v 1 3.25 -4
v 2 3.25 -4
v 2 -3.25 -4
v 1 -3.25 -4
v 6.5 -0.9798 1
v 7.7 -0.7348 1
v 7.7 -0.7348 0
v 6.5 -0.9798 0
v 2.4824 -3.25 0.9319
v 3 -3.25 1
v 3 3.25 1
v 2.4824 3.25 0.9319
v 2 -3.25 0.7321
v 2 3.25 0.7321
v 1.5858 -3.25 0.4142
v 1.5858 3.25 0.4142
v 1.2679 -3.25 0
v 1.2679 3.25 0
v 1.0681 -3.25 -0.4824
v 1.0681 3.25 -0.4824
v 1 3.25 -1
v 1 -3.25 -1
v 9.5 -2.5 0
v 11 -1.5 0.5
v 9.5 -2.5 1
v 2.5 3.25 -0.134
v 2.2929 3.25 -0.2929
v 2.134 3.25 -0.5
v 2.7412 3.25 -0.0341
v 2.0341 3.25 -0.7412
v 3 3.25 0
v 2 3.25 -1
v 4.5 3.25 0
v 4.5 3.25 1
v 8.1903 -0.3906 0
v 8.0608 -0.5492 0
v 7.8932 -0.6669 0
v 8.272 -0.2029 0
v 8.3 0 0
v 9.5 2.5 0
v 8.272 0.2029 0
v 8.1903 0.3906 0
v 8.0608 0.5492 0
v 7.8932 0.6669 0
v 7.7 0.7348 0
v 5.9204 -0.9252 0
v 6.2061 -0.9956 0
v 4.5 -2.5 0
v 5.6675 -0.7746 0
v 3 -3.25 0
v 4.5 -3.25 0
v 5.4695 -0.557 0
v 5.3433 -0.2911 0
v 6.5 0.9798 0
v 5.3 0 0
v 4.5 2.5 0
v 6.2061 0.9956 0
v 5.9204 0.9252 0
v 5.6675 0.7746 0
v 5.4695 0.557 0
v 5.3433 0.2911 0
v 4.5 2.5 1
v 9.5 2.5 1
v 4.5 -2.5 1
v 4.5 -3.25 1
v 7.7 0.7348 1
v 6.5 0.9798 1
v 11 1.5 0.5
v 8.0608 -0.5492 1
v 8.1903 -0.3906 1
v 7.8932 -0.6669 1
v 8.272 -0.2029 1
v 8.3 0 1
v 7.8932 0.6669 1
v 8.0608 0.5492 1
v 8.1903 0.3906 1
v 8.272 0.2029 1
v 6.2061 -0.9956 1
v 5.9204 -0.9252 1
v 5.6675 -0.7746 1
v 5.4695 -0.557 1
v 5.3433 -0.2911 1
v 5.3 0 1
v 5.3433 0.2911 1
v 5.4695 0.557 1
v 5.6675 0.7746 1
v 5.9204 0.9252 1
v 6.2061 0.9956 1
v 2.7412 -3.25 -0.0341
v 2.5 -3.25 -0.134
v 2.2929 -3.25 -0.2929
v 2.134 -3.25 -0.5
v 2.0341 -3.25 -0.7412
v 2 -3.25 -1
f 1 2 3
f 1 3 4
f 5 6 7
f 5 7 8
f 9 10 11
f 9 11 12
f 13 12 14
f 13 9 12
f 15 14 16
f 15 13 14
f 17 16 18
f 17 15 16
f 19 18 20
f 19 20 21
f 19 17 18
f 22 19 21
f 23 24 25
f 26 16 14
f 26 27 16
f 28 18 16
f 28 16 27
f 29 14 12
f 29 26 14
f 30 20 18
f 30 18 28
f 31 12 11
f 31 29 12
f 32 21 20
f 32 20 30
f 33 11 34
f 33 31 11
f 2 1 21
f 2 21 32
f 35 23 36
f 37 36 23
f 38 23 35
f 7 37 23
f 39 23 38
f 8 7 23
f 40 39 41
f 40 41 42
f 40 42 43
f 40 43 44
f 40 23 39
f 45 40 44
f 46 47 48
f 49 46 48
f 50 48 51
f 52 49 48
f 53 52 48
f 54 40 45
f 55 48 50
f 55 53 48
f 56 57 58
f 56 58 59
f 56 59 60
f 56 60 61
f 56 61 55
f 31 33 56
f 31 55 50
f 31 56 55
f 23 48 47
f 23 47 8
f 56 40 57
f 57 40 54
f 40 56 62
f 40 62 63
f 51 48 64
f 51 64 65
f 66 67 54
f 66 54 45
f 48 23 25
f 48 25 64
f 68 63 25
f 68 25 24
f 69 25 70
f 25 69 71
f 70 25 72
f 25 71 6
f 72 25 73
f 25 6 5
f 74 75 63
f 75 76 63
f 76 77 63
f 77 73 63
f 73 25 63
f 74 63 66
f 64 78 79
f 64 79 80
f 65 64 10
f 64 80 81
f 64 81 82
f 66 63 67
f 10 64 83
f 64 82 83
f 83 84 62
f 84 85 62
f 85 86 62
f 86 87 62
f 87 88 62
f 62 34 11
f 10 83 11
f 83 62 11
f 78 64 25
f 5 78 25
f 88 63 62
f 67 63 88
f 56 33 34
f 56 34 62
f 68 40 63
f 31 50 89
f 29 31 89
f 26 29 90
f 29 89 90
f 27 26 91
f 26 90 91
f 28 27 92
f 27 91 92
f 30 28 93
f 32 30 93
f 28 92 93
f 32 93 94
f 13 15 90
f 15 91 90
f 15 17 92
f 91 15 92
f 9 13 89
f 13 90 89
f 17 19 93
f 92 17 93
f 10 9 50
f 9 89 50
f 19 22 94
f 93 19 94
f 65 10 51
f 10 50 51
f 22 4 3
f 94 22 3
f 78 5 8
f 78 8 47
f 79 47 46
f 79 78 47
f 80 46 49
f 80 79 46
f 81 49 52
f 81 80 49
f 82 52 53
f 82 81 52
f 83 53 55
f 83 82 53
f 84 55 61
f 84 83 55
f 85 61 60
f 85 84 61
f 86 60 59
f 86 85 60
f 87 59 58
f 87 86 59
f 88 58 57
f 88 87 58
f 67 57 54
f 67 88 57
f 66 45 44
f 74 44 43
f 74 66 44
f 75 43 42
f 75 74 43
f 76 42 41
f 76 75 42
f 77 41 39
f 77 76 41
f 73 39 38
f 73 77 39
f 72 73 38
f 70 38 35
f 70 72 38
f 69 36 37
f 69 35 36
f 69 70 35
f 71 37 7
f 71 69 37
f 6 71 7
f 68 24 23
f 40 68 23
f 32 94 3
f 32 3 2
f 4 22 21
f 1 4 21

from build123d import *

# Parameters (mm, degrees)
DODANIE_WYCI_GNI_CIE1_DEPTH = 1
WYTNIJ_WYCI_GNI_CIE1_REACH  = 13.514
SZKIC8_W                    = 1
SZKIC8_H                    = 6.5
DODANIE_WYCI_GNI_CIE2_DEPTH = 4
WYTNIJ_WYCI_GNI_CIE2_REACH  = 14.148
SZKIC9_W                    = 1
SZKIC9_H                    = 6.5
KONWERTUJ_START             = -3.25
KONWERTUJ_BRY_2_DEPTH       = 6.5
KONWERTUJ_BRY_2_2_DEPTH     = 6.5
WYTNIJ_WYCI_GNI_CIE3_REACH  = 15.041


# Read off the part's stored shape, not the designer's step: Konwertuj bryłę2
with BuildPart() as part:
    # Szkic1 → Dodanie-wyciągnięcie1 (new body)
    with BuildSketch(Plane.XY):
        Polygon((0, -3.25), (0, 3.25), (4.5, 3.25), (4.5, 2.5), (9.5, 2.5), (11, 1.5), (11, -1.5), (9.5, -2.5), (4.5, -2.5), (4.5, -3.25), align=None)
    extrude(amount=DODANIE_WYCI_GNI_CIE1_DEPTH)

    # Szkic2 → Wytnij-wyciągnięcie1 (cut, up to next)
    with BuildSketch(Plane.XY.offset(1), mode=Mode.PRIVATE) as wytnij_wyci_gni_cie1_sk1:
        with BuildLine():
            Line((6.5, 0.979795897), (7.7, 0.734846923))
            ThreePointArc((7.7, 0.734846923), (8.3, 0), (7.7, -0.734846923))
            Line((7.7, -0.734846923), (6.5, -0.979795897))
            ThreePointArc((6.5, -0.979795897), (5.3, 0), (6.5, 0.979795897))
        make_face()
    wytnij_wyci_gni_cie1_tool1 = extrude(wytnij_wyci_gni_cie1_sk1.sketch, amount=-WYTNIJ_WYCI_GNI_CIE1_REACH, mode=Mode.PRIVATE) & part.part
    add(wytnij_wyci_gni_cie1_tool1.solids().sort_by_distance((6.737463, 0, 1))[0], mode=Mode.SUBTRACT)

    # Szkic8 → Dodanie-wyciągnięcie2 (add)
    with BuildSketch(Plane(origin=(0, 0, 0), x_dir=(-1, 0, 0), z_dir=(0, 0, -1))):
        with Locations((-1.5, 0)):
            Rectangle(SZKIC8_W, SZKIC8_H)
    extrude(amount=DODANIE_WYCI_GNI_CIE2_DEPTH)

    # Szkic9 → Wytnij-wyciągnięcie2 (cut, up to next)
    with BuildSketch(Plane(origin=(0, 0, 0), x_dir=(-1, 0, 0), z_dir=(0, 0, -1)), mode=Mode.PRIVATE) as wytnij_wyci_gni_cie2_sk1:
        with Locations((-0.5, 0)):
            Rectangle(SZKIC9_W, SZKIC9_H)
    wytnij_wyci_gni_cie2_tool1 = extrude(wytnij_wyci_gni_cie2_sk1.sketch, amount=-WYTNIJ_WYCI_GNI_CIE2_REACH, mode=Mode.PRIVATE) & part.part
    add(wytnij_wyci_gni_cie2_tool1.solids().sort_by_distance((0.5, 0, 0))[0], mode=Mode.SUBTRACT)

    # Konwertuj bryłę2 outline → Konwertuj bryłę2 (cut)
    with BuildSketch(Plane(origin=(0, 0, 0), x_dir=(1, 0, 0), z_dir=(0, 1, 0)).offset(KONWERTUJ_START)):
        with BuildLine():
            Line((1, -1), (3, -1))
            ThreePointArc((3, -1), (1.585786438, -0.414213562), (1, 1))
            Line((1, 1), (1, -1))
        make_face()
    extrude(amount=KONWERTUJ_BRY_2_DEPTH, mode=Mode.SUBTRACT)

    # Konwertuj bry_2 2 outline → Konwertuj bry_2 2 (add)
    with BuildSketch(Plane(origin=(0, 0, 0), x_dir=(1, 0, 0), z_dir=(0, 1, 0)).offset(KONWERTUJ_START)):
        with BuildLine():
            Line((2, 0), (3, 0))
            ThreePointArc((3, 0), (2.292893219, 0.292893219), (2, 1))
            Line((2, 1), (2, 0))
        make_face()
    extrude(amount=KONWERTUJ_BRY_2_2_DEPTH)

    # Wytnij-wyciągnięcie3: up to this plane
    wytnij_wyci_gni_cie3_end = Plane(origin=(9.5, 2.5, 0), z_dir=(-0.5547001962252293, -0.8320502943378437, 0))
    # Szkic14 → Wytnij-wyciągnięcie3 (cut, up to the surface)
    with BuildSketch(Plane.XZ.offset(2.5), mode=Mode.PRIVATE) as wytnij_wyci_gni_cie3_sk1:
        Polygon((11, 0), (11, 0.5), (9.5, 0), align=None)
    wytnij_wyci_gni_cie3_tool1 = split(extrude(wytnij_wyci_gni_cie3_sk1.sketch, amount=-WYTNIJ_WYCI_GNI_CIE3_REACH, mode=Mode.PRIVATE), bisect_by=wytnij_wyci_gni_cie3_end, keep=Keep.BOTH, mode=Mode.PRIVATE)
    add(wytnij_wyci_gni_cie3_tool1.solids().sort_by_distance((10.5, -2.5, 0.166667))[0], mode=Mode.SUBTRACT)
    # Szkic14 → Wytnij-wyciągnięcie3 (cut, up to the surface)
    with BuildSketch(Plane.XZ.offset(2.5), mode=Mode.PRIVATE) as wytnij_wyci_gni_cie3_sk2:
        Polygon((11, 0.5), (11, 1), (9.5, 1), align=None)
    wytnij_wyci_gni_cie3_tool2 = split(extrude(wytnij_wyci_gni_cie3_sk2.sketch, amount=-WYTNIJ_WYCI_GNI_CIE3_REACH, mode=Mode.PRIVATE), bisect_by=wytnij_wyci_gni_cie3_end, keep=Keep.BOTH, mode=Mode.PRIVATE)
    add(wytnij_wyci_gni_cie3_tool2.solids().sort_by_distance((10.5, -2.5, 0.833333))[0], mode=Mode.SUBTRACT)


solid = part.part
